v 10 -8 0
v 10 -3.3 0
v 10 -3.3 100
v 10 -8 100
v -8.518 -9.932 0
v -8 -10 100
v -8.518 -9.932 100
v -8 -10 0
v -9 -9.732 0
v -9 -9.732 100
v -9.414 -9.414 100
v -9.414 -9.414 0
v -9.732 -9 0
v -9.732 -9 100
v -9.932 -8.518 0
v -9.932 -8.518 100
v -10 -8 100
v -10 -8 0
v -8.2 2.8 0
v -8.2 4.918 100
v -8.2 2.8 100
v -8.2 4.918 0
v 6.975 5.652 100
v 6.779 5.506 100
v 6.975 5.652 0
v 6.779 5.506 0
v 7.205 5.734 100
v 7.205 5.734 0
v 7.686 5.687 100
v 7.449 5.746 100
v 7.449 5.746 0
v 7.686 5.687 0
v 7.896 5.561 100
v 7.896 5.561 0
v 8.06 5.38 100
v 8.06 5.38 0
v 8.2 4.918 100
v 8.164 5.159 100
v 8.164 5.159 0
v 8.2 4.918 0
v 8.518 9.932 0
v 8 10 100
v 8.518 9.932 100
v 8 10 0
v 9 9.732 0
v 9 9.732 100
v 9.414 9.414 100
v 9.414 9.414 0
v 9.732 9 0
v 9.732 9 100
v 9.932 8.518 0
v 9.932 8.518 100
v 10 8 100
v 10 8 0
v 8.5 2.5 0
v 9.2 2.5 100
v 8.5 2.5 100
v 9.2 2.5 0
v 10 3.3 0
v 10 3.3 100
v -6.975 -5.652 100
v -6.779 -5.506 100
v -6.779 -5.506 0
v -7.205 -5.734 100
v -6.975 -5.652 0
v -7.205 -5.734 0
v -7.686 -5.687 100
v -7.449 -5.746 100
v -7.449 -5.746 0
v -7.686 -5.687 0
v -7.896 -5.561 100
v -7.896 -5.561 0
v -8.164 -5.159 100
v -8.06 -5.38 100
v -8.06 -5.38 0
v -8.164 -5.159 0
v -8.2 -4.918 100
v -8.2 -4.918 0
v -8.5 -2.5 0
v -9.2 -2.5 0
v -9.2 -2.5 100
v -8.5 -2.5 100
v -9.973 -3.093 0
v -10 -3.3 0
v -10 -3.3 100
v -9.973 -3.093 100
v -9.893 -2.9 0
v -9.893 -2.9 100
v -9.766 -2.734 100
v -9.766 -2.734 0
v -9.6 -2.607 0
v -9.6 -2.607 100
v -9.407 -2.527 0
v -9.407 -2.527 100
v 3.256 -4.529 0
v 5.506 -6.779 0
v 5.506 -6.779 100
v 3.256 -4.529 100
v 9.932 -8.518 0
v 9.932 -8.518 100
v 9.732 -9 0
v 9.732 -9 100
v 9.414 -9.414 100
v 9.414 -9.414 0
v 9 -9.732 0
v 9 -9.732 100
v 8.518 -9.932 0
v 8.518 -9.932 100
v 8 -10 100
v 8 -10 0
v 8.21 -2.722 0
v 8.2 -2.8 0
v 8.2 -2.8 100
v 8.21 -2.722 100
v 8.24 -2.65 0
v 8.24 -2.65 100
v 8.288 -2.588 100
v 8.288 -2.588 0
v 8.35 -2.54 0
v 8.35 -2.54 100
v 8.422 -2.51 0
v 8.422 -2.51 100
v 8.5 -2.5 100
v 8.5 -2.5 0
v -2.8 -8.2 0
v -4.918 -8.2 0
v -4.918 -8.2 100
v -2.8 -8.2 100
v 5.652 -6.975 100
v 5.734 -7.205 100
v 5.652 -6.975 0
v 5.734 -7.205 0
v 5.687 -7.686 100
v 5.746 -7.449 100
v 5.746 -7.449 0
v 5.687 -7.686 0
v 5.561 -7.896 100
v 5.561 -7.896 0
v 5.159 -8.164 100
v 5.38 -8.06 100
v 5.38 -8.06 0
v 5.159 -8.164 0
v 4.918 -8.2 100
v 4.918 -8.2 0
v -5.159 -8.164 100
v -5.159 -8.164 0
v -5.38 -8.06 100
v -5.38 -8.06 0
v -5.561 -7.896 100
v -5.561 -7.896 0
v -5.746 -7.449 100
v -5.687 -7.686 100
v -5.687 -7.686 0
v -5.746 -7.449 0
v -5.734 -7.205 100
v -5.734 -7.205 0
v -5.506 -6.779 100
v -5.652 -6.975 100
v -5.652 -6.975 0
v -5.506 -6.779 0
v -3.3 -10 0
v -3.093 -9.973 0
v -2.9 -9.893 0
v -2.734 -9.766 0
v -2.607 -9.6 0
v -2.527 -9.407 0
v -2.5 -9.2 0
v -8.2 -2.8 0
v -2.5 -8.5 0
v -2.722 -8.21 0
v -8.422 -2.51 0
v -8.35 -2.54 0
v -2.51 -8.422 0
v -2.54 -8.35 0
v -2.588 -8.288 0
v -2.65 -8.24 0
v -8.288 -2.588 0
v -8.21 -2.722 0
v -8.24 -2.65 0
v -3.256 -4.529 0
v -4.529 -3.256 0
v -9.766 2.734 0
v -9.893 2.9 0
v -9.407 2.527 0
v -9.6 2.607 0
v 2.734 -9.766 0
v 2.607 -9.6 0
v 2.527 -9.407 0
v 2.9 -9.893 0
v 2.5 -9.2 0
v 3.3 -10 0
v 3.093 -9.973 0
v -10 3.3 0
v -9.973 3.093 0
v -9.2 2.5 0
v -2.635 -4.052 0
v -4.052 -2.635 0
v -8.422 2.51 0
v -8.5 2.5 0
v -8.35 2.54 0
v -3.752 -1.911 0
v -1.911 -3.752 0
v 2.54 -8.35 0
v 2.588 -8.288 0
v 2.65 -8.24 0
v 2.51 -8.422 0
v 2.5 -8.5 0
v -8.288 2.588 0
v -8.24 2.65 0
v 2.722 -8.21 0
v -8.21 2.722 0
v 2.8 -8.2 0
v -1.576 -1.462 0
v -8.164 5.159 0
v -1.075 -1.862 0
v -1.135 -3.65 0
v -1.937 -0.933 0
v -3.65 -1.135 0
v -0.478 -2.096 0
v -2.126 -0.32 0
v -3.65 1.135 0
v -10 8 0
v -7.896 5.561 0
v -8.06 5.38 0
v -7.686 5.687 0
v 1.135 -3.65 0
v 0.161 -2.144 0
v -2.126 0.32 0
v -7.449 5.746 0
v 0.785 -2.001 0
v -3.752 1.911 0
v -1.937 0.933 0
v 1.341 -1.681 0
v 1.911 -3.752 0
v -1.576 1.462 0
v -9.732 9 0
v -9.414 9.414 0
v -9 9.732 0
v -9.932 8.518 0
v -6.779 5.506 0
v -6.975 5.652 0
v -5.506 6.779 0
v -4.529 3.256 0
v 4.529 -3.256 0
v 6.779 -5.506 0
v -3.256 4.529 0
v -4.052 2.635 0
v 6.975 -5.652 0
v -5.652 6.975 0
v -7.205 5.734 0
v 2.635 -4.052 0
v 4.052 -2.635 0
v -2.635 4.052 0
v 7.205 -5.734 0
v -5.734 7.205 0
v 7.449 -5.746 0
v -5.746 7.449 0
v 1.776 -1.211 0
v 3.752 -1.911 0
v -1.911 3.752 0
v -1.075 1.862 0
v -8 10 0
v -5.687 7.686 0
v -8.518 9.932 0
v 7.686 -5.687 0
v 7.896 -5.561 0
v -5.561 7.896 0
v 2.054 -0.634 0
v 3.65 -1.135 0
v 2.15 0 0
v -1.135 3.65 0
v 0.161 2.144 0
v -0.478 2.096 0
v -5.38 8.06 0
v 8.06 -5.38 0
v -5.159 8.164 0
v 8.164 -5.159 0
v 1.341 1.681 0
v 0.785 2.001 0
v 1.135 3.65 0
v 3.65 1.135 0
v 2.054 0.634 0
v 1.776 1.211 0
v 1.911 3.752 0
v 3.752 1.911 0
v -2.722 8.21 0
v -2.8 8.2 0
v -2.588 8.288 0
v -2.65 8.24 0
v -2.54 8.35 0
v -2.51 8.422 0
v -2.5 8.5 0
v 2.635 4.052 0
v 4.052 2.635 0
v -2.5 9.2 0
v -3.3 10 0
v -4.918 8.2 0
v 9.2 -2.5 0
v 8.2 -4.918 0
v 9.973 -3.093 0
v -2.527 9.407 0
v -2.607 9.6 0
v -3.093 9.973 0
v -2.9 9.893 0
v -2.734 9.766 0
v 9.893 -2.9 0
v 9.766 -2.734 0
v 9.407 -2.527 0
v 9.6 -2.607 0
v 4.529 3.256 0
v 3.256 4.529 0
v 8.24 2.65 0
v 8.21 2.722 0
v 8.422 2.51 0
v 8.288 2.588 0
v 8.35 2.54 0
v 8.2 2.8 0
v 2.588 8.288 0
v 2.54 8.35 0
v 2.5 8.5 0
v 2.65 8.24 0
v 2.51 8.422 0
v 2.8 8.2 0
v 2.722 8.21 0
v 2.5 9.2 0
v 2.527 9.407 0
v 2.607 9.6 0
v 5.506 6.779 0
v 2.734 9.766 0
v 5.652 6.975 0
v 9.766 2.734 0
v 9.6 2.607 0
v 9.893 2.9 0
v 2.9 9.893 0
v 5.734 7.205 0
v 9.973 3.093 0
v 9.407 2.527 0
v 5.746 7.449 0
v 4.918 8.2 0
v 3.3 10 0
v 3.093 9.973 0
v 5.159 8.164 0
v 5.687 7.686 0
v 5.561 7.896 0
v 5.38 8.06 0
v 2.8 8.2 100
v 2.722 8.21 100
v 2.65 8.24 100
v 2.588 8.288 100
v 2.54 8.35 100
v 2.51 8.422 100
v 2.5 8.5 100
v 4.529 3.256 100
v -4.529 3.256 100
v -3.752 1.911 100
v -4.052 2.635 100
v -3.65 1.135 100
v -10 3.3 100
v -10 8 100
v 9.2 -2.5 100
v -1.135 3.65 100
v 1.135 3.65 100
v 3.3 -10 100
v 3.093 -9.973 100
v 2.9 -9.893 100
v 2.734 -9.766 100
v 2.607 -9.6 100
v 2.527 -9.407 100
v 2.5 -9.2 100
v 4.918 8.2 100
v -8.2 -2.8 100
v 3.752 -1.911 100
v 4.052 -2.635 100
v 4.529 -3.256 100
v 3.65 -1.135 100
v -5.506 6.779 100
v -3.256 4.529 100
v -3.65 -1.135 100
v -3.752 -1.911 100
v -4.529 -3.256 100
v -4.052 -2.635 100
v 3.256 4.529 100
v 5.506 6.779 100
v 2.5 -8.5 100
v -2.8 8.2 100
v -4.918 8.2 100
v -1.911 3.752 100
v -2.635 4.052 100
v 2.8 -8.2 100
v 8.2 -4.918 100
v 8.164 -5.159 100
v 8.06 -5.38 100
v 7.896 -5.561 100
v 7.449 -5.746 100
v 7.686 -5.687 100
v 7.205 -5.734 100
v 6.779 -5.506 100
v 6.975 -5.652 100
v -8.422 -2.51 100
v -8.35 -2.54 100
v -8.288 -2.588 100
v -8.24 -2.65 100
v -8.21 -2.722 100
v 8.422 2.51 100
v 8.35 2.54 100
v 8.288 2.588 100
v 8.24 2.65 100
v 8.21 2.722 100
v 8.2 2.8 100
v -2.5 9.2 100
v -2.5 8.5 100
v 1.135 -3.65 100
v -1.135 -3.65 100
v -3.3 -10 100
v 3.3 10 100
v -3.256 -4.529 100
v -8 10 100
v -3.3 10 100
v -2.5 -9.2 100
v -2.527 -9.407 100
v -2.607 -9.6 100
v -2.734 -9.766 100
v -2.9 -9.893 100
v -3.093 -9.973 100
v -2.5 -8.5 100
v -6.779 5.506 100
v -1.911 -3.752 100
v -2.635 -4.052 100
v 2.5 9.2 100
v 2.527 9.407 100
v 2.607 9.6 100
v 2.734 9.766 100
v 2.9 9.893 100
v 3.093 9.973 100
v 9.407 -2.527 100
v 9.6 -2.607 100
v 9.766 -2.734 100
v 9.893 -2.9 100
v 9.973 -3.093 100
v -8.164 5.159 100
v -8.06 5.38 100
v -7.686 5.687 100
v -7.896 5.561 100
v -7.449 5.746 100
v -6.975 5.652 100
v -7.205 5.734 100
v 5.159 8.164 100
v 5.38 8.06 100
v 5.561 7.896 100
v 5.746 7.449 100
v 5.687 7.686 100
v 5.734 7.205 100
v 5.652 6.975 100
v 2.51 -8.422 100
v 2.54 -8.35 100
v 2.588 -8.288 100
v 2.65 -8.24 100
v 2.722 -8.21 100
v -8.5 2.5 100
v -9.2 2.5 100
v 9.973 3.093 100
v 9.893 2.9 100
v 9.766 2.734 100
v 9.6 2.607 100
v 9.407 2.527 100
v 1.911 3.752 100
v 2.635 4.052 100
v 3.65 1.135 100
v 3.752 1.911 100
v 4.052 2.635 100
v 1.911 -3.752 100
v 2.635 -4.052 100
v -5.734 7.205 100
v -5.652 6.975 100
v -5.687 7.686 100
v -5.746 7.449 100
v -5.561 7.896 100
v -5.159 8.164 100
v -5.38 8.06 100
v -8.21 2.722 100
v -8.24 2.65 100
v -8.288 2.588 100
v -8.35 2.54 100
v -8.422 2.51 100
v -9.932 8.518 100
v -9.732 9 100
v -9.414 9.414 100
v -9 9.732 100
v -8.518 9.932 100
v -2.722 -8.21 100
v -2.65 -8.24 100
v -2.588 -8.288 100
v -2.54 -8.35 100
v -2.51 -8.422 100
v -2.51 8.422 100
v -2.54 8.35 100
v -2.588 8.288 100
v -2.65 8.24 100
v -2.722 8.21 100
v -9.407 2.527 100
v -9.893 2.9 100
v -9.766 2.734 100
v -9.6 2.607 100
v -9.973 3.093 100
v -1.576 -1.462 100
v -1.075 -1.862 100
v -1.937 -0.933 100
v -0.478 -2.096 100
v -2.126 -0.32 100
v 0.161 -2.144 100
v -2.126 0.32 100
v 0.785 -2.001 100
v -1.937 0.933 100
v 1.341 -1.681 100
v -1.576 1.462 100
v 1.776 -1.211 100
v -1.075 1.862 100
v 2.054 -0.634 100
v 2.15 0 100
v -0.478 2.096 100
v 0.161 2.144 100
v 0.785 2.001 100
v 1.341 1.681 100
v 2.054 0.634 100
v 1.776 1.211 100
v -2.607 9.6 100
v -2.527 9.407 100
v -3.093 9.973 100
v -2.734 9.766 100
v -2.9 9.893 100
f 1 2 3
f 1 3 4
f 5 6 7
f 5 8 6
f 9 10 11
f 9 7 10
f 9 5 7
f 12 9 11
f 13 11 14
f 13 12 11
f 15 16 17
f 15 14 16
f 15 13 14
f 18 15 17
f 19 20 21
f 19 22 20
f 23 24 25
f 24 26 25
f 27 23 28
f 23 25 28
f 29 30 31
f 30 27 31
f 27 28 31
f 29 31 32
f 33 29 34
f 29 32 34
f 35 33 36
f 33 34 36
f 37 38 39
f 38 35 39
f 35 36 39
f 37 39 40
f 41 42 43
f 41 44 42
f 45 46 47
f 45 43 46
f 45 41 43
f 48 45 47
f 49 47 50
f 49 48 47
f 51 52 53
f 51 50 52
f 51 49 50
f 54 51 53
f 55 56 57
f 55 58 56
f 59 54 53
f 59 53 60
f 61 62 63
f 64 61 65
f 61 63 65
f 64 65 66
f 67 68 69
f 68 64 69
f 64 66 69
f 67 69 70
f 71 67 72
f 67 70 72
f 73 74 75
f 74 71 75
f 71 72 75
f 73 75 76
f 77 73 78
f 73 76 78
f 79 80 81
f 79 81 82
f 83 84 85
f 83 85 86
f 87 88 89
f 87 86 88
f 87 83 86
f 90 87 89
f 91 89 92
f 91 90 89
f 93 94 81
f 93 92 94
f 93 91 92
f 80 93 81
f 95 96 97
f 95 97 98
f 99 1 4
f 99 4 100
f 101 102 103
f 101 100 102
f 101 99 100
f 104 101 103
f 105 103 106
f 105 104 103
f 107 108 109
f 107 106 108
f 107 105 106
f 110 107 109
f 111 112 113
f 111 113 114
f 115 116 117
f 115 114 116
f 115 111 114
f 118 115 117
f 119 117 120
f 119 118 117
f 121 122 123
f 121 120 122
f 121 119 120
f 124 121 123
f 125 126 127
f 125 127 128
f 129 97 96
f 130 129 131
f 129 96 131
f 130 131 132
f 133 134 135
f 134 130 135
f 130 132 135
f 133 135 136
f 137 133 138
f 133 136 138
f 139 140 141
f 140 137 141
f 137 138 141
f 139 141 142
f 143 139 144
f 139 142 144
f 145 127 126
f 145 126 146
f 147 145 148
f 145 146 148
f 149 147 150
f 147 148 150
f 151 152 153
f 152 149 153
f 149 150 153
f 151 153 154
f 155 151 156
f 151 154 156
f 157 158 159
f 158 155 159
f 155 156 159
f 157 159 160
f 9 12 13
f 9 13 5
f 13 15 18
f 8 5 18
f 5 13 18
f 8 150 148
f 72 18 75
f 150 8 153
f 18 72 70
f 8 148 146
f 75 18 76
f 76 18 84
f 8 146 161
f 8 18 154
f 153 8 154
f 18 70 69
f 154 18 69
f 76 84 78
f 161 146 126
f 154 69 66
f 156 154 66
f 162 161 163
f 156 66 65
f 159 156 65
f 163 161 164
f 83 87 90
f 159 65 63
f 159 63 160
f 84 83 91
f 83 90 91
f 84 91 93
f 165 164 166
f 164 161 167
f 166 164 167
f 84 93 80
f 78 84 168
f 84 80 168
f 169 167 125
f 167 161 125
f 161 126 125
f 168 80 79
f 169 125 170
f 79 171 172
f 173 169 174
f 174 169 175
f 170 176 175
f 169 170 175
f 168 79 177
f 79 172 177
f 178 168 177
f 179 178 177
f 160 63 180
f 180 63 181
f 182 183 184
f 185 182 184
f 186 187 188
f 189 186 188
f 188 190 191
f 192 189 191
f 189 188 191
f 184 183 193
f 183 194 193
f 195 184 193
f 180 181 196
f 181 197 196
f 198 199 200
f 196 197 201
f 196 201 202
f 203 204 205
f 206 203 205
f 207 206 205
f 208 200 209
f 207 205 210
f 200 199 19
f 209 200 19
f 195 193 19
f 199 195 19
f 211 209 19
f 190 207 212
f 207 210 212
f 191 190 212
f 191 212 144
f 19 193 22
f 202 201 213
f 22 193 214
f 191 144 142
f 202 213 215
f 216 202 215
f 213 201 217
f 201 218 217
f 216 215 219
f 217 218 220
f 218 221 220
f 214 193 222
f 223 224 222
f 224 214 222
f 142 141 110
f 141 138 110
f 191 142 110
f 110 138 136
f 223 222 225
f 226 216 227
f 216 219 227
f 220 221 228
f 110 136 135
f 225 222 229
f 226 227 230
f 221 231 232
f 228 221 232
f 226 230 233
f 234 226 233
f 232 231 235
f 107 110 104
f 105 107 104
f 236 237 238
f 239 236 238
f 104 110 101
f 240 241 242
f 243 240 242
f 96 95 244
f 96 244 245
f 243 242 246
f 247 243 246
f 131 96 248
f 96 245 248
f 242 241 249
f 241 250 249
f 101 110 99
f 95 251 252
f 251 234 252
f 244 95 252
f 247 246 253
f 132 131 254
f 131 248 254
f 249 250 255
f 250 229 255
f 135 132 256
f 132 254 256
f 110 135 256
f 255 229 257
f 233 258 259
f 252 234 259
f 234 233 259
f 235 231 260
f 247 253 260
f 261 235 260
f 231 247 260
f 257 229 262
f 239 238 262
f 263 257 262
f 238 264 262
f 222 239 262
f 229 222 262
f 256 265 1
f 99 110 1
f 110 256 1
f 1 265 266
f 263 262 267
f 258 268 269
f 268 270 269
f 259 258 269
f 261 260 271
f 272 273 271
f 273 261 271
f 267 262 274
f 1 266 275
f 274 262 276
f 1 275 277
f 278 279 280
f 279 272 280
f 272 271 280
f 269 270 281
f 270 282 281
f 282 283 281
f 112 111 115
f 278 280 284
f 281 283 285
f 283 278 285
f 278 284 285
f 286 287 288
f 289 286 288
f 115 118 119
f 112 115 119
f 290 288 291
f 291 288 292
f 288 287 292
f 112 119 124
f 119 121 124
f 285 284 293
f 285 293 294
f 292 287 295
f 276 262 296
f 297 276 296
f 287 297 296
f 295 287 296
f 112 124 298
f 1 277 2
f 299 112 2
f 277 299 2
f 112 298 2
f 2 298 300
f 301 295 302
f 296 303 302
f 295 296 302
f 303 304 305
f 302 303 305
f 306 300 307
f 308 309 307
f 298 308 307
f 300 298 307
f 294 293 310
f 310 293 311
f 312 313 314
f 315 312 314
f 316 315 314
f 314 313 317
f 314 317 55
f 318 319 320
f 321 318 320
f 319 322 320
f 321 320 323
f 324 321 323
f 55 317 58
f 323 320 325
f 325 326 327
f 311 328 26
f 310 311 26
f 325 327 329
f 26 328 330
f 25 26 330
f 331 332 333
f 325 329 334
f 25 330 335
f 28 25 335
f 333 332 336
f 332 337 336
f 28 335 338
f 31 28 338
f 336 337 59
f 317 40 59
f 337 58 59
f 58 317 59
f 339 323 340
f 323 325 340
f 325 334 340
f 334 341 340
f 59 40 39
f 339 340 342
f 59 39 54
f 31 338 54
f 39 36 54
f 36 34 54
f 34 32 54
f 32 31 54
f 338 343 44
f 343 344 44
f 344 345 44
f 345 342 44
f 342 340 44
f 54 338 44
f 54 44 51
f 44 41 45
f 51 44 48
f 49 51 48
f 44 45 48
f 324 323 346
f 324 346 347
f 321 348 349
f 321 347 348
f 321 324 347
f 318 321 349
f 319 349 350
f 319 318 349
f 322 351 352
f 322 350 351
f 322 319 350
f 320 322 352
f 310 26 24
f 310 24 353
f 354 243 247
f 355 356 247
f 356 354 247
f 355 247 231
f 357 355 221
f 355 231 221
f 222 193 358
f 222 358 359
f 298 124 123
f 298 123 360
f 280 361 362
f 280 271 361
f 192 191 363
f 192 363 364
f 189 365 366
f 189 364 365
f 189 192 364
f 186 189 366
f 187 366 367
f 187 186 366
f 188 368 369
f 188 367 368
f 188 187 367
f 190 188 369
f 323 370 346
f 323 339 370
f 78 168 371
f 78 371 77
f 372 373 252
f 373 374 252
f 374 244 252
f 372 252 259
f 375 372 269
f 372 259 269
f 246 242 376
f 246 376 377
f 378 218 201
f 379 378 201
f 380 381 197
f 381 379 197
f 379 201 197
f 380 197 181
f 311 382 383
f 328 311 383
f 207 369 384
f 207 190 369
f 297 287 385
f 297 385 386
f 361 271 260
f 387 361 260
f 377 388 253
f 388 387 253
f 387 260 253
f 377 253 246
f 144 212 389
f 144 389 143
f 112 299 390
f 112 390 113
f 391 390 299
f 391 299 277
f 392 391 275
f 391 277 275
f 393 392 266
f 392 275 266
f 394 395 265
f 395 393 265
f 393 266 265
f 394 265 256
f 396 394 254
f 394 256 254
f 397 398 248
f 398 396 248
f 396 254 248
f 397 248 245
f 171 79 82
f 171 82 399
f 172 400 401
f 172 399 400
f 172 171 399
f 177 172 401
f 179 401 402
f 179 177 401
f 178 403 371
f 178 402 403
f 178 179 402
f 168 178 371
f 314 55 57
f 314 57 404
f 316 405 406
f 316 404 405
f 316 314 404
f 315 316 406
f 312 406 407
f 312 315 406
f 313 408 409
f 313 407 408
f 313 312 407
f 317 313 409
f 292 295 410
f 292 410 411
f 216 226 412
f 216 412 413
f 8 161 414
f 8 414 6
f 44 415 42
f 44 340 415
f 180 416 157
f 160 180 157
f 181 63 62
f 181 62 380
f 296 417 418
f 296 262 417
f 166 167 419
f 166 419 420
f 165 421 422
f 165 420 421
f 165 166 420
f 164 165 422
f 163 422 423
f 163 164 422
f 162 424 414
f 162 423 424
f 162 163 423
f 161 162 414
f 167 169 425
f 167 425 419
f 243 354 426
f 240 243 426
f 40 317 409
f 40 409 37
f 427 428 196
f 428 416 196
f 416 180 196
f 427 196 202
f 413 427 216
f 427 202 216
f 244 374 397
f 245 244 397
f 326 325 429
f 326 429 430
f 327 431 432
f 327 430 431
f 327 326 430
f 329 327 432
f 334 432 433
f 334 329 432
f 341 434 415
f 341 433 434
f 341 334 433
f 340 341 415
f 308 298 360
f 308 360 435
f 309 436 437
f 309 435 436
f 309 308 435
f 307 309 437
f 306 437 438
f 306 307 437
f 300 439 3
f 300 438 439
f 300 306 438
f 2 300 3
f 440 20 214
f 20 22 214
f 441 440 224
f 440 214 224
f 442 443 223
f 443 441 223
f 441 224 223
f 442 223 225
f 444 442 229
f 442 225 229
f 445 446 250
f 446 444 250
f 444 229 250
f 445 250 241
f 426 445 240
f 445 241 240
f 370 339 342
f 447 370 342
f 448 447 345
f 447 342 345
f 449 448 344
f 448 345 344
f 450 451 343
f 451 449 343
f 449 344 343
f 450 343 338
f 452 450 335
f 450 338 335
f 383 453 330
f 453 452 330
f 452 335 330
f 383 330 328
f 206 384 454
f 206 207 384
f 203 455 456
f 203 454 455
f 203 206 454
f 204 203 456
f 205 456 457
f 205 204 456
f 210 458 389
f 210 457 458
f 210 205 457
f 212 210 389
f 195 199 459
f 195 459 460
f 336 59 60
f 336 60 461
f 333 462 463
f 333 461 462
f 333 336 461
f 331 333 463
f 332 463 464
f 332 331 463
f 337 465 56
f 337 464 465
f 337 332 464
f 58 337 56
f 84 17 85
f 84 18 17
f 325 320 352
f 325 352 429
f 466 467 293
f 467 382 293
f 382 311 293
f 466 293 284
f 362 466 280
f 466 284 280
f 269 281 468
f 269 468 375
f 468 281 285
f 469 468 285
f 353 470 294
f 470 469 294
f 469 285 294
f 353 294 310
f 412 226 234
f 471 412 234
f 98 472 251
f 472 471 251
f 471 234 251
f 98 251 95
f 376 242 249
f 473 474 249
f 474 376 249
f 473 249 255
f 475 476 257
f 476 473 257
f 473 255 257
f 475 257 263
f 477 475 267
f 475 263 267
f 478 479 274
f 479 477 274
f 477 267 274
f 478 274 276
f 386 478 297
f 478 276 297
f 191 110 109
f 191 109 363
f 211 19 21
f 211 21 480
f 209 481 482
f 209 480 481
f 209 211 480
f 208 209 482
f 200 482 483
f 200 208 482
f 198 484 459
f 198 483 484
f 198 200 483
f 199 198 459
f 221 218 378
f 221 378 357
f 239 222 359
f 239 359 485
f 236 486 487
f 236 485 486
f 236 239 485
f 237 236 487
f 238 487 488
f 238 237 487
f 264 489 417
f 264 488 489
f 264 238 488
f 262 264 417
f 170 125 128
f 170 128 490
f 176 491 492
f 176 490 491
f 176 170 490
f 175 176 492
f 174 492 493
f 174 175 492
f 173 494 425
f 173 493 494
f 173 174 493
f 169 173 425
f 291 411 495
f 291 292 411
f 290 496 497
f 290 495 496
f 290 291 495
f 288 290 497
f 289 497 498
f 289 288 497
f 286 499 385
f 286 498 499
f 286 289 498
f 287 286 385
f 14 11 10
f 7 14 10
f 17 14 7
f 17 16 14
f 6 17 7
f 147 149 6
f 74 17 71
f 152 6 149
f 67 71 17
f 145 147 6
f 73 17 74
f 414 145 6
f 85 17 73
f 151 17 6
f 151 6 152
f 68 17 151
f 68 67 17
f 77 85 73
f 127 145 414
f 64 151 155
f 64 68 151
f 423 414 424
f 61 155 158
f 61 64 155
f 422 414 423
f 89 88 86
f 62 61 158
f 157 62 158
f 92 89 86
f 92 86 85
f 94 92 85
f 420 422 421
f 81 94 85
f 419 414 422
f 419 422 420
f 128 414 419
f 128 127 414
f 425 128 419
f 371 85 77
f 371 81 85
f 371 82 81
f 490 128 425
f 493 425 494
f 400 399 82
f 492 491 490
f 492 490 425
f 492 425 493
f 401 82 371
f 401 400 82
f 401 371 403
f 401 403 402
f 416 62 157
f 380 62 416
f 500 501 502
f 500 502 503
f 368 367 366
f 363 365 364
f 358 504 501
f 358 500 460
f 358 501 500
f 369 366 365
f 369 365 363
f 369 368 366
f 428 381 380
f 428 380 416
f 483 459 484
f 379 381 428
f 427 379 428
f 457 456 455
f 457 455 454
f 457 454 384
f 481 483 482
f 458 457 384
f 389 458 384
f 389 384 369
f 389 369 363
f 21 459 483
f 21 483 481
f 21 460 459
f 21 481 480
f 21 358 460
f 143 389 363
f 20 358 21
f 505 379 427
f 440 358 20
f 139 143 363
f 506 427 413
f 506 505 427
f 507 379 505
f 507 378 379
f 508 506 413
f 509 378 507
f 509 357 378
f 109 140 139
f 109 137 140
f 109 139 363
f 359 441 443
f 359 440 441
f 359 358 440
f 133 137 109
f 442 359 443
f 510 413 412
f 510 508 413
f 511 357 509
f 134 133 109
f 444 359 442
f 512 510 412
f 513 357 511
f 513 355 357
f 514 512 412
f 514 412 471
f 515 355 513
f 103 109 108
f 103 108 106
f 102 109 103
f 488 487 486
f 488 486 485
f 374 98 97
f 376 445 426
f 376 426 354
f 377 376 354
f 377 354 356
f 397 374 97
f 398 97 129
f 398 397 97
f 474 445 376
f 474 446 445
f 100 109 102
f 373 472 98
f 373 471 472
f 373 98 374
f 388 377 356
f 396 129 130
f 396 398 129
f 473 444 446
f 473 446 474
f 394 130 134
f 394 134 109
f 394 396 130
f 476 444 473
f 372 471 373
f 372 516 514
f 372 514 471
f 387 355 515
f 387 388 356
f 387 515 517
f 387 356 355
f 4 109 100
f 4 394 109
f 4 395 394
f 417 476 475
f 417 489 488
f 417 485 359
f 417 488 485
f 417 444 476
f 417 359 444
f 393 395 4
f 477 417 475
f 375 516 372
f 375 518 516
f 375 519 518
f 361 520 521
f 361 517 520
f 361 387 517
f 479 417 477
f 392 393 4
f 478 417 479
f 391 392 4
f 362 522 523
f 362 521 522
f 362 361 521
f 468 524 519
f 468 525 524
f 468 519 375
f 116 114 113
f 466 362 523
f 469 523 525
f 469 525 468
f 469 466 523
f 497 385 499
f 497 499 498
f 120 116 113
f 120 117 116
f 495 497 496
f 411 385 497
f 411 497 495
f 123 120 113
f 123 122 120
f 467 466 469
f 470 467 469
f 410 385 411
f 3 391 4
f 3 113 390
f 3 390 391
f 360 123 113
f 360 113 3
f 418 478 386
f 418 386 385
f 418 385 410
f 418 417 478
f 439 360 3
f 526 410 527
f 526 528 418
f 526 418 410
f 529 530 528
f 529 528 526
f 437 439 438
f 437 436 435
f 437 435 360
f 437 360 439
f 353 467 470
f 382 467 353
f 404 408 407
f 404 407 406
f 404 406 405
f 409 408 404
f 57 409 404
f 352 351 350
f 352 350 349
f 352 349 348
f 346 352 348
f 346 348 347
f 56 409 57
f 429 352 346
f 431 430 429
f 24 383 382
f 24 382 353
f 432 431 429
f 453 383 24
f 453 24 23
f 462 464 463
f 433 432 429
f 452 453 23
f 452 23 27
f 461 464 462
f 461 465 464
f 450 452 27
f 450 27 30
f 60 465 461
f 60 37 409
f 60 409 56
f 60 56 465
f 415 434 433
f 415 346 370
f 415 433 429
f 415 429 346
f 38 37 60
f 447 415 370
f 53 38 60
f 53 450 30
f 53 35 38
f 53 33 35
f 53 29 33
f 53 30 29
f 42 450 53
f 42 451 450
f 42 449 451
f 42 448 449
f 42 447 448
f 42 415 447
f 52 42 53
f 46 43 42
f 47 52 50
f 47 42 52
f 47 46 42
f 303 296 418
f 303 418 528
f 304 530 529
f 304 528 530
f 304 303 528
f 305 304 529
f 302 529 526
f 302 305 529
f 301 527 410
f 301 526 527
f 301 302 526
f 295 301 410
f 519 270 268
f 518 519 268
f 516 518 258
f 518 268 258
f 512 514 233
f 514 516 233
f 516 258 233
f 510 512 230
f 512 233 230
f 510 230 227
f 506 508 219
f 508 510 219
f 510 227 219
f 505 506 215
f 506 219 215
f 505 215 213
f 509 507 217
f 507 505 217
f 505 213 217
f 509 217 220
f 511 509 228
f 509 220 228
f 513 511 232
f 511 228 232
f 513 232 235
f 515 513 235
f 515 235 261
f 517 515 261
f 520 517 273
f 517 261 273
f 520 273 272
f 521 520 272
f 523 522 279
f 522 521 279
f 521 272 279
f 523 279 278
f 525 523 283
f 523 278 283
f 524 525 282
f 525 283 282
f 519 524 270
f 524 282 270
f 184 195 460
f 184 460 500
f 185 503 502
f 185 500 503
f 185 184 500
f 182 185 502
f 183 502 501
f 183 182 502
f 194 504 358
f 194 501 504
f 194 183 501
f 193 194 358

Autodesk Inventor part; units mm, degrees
ref_plane "YZ Plane" through (0, 0, 0) normal (1, 0, 0) x (0, 1, 0)
ref_plane "Startebene" through (0, 0, 0) normal (0, 0, 1) x (1, 0, 0)
ref_plane "Endebene" through (0, 0, 100) normal (0, 0, 1) x (1, 0, 0)
sketch "Skizze" plane through (0, 0, 0) normal (0, 0, 1) x (1, 0, 0)
  arc A0 (-4.5287, -3.2559) -> (-3.65, -1.1346) centre (-6.65, -1.1346) ccw
  line L0 (-3.65, -1.1346) -> (-3.65, 1.1346)
  circle A1 centre (0, 0) radius 2.15
  line L1 (1.1346, -3.65) -> (-1.1346, -3.65)
  arc A2 (-1.1346, -3.65) -> (-3.2559, -4.5287) centre (-1.1346, -6.65) ccw
  line L2 (-6.779, -5.5062) -> (-4.5287, -3.2559)
  line L3 (-3.2559, -4.5287) -> (-5.5062, -6.779)
  arc A3 (-2.5, -8.5) -> (-2.8, -8.2) centre (-2.8, -8.5) ccw
  line L4 (-2.5, -8.5) -> (-2.5, -9.2)
  line L5 (-4.9176, -8.2) -> (-2.8, -8.2)
  arc A4 (-5.5062, -6.779) -> (-4.9176, -8.2) centre (-4.9176, -7.3676) ccw
  arc A5 (-3.3, -10) -> (-2.5, -9.2) centre (-3.3, -9.2) ccw
  line L6 (-3.3, -10) -> (-8, -10)
  line L7 (10, -3.3) -> (10, -8)
  line L8 (5.5062, -6.779) -> (3.2559, -4.5287)
  arc A6 (6.779, -5.5062) -> (8.2, -4.9176) centre (7.3676, -4.9176) ccw
  arc A7 (3.2559, -4.5287) -> (1.1346, -3.65) centre (1.1346, -6.65) ccw
  line L9 (4.5287, -3.2559) -> (6.779, -5.5062)
  arc A8 (3.65, -1.1346) -> (4.5287, -3.2559) centre (6.65, -1.1346) ccw
  arc A9 (8.5, -2.5) -> (8.2, -2.8) centre (8.5, -2.8) ccw
  line L10 (3.65, 1.1346) -> (3.65, -1.1346)
  line L11 (8.5, -2.5) -> (9.2, -2.5)
  arc A10 (10, -3.3) -> (9.2, -2.5) centre (9.2, -3.3) ccw
  line L12 (8.2, -4.9176) -> (8.2, -2.8)
  line L13 (2.5, 8.5) -> (2.5, 9.2)
  arc A11 (2.5, 8.5) -> (2.8, 8.2) centre (2.8, 8.5) ccw
  arc A12 (1.1346, 3.65) -> (3.2559, 4.5287) centre (1.1346, 6.65) ccw
  line L14 (-1.1346, 3.65) -> (1.1346, 3.65)
  arc A13 (3.3, 10) -> (2.5, 9.2) centre (3.3, 9.2) ccw
  line L15 (4.9176, 8.2) -> (2.8, 8.2)
  arc A14 (4.5287, 3.2559) -> (3.65, 1.1346) centre (6.65, 1.1346) ccw
  line L16 (3.2559, 4.5287) -> (5.5062, 6.779)
  arc A15 (5.5062, 6.779) -> (4.9176, 8.2) centre (4.9176, 7.3676) ccw
  line L17 (6.779, 5.5062) -> (4.5287, 3.2559)
  line L18 (3.3, 10) -> (8, 10)
  arc A16 (10, 8) -> (8, 10) centre (8, 8) ccw
  line L19 (8.2, 2.8) -> (8.2, 4.9176)
  line L20 (10, 8) -> (10, 3.3)
  arc A17 (8.2, 4.9176) -> (6.779, 5.5062) centre (7.3676, 4.9176) ccw
  line L21 (-2.8, 8.2) -> (-4.9176, 8.2)
  line L22 (-2.5, 9.2) -> (-2.5, 8.5)
  arc A18 (-2.5, 9.2) -> (-3.3, 10) centre (-3.3, 9.2) ccw
  arc A19 (-2.8, 8.2) -> (-2.5, 8.5) centre (-2.8, 8.5) ccw
  arc A20 (-3.65, 1.1346) -> (-4.5287, 3.2559) centre (-6.65, 1.1346) ccw
  arc A21 (-3.2559, 4.5287) -> (-1.1346, 3.65) centre (-1.1346, 6.65) ccw
  arc A22 (4.9176, -8.2) -> (5.5062, -6.779) centre (4.9176, -7.3676) ccw
  arc A23 (8, -10) -> (10, -8) centre (8, -8) ccw
  line L23 (2.8, -8.2) -> (4.9176, -8.2)
  line L24 (8, -10) -> (3.3, -10)
  arc A24 (2.8, -8.2) -> (2.5, -8.5) centre (2.8, -8.5) ccw
  arc A25 (2.5, -9.2) -> (3.3, -10) centre (3.3, -9.2) ccw
  line L25 (2.5, -9.2) -> (2.5, -8.5)
  arc A26 (8.2, 2.8) -> (8.5, 2.5) centre (8.5, 2.8) ccw
  line L26 (9.2, 2.5) -> (8.5, 2.5)
  arc A27 (9.2, 2.5) -> (10, 3.3) centre (9.2, 3.3) ccw
  arc A28 (-4.9176, 8.2) -> (-5.5062, 6.779) centre (-4.9176, 7.3676) ccw
  line L27 (-8, 10) -> (-3.3, 10)
  line L28 (-5.5062, 6.779) -> (-3.2559, 4.5287)
  arc A29 (-8, 10) -> (-10, 8) centre (-8, 8) ccw
  arc A30 (-6.779, 5.5062) -> (-8.2, 4.9176) centre (-7.3676, 4.9176) ccw
  line L29 (-10, 3.3) -> (-10, 8)
  line L30 (-8.2, 4.9176) -> (-8.2, 2.8)
  arc A31 (-8.5, 2.5) -> (-8.2, 2.8) centre (-8.5, 2.8) ccw
  line L31 (-8.5, 2.5) -> (-9.2, 2.5)
  arc A32 (-10, 3.3) -> (-9.2, 2.5) centre (-9.2, 3.3) ccw
  line L32 (-4.5287, 3.2559) -> (-6.779, 5.5062)
  line L33 (-10, -8) -> (-10, -3.3)
  arc A33 (-8.2, -4.9176) -> (-6.779, -5.5062) centre (-7.3676, -4.9176) ccw
  arc A34 (-10, -8) -> (-8, -10) centre (-8, -8) ccw
  line L34 (-10, -8) -> (-10, -3.3)
  arc A35 (-8.2, -2.8) -> (-8.5, -2.5) centre (-8.5, -2.8) ccw
  line L35 (-9.2, -2.5) -> (-8.5, -2.5)
  arc A36 (-9.2, -2.5) -> (-10, -3.3) centre (-9.2, -3.3) ccw
  line L36 (-8.2, -2.8) -> (-8.2, -4.9176)
  dimension "d4" = 4.3
  dimension "d5" = 6.35
  dimension "d6" = 10
  dimension "d7" = 2.5
  dimension "d8" = 5.8
  dimension "d9" = 10.5
  dimension "d10" = 3
  dimension "d11" = 7.5
  dimension "d12" = 12.5
  dimension "d13" = 13.65
  dimension "d14" = 5.7
  dimension "d15" = 10.7
  dimension "d16" = 1.15
  dimension "d17" = 6.15
  dimension "d18" = 1.8
  dimension "d19" = 0.8
  dimension "d20" = 0.3
  dimension "d21" = 2
  dimension "d22" = 0.8324
  dimension "d23" = 45
  dimension "d24" = 90
  dimension "d25" = 90
  dimension "d26" = 1.8
  dimension "d27" = 18.2
  dimension "d28" = 20
  dimension "d29" = 5
  dimension "d30" = 7.5
  dimension "d31" = 1.8
  dimension "d32" = 0.9
  dimension "d33" = 0.9
  dimension "d34" = 20
extrude "Körper" add sketch "Skizze" along normal up to surface (100 mm away) from surface at 0
sketch "Skizze6" plane through (0, 0, 0) normal (0, 0, 1) x (1, 0, 0)
  line L0 (0, 0) -> (10, 0)
ref_plane "Arbeitsebene4" through (0, 0, 0) normal (0, -1, 0) x (1, 0, 0)
sketch "Skizze7" plane through (0, 0, 0) normal (0, -1, 0) x (1, 0, 0)
  line L0 (-2, 0) -> (12, 0)
  line L1 (-2, 100) -> (12, 100)
  dimension "d43" = 100
equation "\"G_OFFSET_START\" = 0"
equation "\"G_OFFSET_END\" = 0"
equation "\"G_L\" = d43"
properties part number "BT001_trajan20_22"
